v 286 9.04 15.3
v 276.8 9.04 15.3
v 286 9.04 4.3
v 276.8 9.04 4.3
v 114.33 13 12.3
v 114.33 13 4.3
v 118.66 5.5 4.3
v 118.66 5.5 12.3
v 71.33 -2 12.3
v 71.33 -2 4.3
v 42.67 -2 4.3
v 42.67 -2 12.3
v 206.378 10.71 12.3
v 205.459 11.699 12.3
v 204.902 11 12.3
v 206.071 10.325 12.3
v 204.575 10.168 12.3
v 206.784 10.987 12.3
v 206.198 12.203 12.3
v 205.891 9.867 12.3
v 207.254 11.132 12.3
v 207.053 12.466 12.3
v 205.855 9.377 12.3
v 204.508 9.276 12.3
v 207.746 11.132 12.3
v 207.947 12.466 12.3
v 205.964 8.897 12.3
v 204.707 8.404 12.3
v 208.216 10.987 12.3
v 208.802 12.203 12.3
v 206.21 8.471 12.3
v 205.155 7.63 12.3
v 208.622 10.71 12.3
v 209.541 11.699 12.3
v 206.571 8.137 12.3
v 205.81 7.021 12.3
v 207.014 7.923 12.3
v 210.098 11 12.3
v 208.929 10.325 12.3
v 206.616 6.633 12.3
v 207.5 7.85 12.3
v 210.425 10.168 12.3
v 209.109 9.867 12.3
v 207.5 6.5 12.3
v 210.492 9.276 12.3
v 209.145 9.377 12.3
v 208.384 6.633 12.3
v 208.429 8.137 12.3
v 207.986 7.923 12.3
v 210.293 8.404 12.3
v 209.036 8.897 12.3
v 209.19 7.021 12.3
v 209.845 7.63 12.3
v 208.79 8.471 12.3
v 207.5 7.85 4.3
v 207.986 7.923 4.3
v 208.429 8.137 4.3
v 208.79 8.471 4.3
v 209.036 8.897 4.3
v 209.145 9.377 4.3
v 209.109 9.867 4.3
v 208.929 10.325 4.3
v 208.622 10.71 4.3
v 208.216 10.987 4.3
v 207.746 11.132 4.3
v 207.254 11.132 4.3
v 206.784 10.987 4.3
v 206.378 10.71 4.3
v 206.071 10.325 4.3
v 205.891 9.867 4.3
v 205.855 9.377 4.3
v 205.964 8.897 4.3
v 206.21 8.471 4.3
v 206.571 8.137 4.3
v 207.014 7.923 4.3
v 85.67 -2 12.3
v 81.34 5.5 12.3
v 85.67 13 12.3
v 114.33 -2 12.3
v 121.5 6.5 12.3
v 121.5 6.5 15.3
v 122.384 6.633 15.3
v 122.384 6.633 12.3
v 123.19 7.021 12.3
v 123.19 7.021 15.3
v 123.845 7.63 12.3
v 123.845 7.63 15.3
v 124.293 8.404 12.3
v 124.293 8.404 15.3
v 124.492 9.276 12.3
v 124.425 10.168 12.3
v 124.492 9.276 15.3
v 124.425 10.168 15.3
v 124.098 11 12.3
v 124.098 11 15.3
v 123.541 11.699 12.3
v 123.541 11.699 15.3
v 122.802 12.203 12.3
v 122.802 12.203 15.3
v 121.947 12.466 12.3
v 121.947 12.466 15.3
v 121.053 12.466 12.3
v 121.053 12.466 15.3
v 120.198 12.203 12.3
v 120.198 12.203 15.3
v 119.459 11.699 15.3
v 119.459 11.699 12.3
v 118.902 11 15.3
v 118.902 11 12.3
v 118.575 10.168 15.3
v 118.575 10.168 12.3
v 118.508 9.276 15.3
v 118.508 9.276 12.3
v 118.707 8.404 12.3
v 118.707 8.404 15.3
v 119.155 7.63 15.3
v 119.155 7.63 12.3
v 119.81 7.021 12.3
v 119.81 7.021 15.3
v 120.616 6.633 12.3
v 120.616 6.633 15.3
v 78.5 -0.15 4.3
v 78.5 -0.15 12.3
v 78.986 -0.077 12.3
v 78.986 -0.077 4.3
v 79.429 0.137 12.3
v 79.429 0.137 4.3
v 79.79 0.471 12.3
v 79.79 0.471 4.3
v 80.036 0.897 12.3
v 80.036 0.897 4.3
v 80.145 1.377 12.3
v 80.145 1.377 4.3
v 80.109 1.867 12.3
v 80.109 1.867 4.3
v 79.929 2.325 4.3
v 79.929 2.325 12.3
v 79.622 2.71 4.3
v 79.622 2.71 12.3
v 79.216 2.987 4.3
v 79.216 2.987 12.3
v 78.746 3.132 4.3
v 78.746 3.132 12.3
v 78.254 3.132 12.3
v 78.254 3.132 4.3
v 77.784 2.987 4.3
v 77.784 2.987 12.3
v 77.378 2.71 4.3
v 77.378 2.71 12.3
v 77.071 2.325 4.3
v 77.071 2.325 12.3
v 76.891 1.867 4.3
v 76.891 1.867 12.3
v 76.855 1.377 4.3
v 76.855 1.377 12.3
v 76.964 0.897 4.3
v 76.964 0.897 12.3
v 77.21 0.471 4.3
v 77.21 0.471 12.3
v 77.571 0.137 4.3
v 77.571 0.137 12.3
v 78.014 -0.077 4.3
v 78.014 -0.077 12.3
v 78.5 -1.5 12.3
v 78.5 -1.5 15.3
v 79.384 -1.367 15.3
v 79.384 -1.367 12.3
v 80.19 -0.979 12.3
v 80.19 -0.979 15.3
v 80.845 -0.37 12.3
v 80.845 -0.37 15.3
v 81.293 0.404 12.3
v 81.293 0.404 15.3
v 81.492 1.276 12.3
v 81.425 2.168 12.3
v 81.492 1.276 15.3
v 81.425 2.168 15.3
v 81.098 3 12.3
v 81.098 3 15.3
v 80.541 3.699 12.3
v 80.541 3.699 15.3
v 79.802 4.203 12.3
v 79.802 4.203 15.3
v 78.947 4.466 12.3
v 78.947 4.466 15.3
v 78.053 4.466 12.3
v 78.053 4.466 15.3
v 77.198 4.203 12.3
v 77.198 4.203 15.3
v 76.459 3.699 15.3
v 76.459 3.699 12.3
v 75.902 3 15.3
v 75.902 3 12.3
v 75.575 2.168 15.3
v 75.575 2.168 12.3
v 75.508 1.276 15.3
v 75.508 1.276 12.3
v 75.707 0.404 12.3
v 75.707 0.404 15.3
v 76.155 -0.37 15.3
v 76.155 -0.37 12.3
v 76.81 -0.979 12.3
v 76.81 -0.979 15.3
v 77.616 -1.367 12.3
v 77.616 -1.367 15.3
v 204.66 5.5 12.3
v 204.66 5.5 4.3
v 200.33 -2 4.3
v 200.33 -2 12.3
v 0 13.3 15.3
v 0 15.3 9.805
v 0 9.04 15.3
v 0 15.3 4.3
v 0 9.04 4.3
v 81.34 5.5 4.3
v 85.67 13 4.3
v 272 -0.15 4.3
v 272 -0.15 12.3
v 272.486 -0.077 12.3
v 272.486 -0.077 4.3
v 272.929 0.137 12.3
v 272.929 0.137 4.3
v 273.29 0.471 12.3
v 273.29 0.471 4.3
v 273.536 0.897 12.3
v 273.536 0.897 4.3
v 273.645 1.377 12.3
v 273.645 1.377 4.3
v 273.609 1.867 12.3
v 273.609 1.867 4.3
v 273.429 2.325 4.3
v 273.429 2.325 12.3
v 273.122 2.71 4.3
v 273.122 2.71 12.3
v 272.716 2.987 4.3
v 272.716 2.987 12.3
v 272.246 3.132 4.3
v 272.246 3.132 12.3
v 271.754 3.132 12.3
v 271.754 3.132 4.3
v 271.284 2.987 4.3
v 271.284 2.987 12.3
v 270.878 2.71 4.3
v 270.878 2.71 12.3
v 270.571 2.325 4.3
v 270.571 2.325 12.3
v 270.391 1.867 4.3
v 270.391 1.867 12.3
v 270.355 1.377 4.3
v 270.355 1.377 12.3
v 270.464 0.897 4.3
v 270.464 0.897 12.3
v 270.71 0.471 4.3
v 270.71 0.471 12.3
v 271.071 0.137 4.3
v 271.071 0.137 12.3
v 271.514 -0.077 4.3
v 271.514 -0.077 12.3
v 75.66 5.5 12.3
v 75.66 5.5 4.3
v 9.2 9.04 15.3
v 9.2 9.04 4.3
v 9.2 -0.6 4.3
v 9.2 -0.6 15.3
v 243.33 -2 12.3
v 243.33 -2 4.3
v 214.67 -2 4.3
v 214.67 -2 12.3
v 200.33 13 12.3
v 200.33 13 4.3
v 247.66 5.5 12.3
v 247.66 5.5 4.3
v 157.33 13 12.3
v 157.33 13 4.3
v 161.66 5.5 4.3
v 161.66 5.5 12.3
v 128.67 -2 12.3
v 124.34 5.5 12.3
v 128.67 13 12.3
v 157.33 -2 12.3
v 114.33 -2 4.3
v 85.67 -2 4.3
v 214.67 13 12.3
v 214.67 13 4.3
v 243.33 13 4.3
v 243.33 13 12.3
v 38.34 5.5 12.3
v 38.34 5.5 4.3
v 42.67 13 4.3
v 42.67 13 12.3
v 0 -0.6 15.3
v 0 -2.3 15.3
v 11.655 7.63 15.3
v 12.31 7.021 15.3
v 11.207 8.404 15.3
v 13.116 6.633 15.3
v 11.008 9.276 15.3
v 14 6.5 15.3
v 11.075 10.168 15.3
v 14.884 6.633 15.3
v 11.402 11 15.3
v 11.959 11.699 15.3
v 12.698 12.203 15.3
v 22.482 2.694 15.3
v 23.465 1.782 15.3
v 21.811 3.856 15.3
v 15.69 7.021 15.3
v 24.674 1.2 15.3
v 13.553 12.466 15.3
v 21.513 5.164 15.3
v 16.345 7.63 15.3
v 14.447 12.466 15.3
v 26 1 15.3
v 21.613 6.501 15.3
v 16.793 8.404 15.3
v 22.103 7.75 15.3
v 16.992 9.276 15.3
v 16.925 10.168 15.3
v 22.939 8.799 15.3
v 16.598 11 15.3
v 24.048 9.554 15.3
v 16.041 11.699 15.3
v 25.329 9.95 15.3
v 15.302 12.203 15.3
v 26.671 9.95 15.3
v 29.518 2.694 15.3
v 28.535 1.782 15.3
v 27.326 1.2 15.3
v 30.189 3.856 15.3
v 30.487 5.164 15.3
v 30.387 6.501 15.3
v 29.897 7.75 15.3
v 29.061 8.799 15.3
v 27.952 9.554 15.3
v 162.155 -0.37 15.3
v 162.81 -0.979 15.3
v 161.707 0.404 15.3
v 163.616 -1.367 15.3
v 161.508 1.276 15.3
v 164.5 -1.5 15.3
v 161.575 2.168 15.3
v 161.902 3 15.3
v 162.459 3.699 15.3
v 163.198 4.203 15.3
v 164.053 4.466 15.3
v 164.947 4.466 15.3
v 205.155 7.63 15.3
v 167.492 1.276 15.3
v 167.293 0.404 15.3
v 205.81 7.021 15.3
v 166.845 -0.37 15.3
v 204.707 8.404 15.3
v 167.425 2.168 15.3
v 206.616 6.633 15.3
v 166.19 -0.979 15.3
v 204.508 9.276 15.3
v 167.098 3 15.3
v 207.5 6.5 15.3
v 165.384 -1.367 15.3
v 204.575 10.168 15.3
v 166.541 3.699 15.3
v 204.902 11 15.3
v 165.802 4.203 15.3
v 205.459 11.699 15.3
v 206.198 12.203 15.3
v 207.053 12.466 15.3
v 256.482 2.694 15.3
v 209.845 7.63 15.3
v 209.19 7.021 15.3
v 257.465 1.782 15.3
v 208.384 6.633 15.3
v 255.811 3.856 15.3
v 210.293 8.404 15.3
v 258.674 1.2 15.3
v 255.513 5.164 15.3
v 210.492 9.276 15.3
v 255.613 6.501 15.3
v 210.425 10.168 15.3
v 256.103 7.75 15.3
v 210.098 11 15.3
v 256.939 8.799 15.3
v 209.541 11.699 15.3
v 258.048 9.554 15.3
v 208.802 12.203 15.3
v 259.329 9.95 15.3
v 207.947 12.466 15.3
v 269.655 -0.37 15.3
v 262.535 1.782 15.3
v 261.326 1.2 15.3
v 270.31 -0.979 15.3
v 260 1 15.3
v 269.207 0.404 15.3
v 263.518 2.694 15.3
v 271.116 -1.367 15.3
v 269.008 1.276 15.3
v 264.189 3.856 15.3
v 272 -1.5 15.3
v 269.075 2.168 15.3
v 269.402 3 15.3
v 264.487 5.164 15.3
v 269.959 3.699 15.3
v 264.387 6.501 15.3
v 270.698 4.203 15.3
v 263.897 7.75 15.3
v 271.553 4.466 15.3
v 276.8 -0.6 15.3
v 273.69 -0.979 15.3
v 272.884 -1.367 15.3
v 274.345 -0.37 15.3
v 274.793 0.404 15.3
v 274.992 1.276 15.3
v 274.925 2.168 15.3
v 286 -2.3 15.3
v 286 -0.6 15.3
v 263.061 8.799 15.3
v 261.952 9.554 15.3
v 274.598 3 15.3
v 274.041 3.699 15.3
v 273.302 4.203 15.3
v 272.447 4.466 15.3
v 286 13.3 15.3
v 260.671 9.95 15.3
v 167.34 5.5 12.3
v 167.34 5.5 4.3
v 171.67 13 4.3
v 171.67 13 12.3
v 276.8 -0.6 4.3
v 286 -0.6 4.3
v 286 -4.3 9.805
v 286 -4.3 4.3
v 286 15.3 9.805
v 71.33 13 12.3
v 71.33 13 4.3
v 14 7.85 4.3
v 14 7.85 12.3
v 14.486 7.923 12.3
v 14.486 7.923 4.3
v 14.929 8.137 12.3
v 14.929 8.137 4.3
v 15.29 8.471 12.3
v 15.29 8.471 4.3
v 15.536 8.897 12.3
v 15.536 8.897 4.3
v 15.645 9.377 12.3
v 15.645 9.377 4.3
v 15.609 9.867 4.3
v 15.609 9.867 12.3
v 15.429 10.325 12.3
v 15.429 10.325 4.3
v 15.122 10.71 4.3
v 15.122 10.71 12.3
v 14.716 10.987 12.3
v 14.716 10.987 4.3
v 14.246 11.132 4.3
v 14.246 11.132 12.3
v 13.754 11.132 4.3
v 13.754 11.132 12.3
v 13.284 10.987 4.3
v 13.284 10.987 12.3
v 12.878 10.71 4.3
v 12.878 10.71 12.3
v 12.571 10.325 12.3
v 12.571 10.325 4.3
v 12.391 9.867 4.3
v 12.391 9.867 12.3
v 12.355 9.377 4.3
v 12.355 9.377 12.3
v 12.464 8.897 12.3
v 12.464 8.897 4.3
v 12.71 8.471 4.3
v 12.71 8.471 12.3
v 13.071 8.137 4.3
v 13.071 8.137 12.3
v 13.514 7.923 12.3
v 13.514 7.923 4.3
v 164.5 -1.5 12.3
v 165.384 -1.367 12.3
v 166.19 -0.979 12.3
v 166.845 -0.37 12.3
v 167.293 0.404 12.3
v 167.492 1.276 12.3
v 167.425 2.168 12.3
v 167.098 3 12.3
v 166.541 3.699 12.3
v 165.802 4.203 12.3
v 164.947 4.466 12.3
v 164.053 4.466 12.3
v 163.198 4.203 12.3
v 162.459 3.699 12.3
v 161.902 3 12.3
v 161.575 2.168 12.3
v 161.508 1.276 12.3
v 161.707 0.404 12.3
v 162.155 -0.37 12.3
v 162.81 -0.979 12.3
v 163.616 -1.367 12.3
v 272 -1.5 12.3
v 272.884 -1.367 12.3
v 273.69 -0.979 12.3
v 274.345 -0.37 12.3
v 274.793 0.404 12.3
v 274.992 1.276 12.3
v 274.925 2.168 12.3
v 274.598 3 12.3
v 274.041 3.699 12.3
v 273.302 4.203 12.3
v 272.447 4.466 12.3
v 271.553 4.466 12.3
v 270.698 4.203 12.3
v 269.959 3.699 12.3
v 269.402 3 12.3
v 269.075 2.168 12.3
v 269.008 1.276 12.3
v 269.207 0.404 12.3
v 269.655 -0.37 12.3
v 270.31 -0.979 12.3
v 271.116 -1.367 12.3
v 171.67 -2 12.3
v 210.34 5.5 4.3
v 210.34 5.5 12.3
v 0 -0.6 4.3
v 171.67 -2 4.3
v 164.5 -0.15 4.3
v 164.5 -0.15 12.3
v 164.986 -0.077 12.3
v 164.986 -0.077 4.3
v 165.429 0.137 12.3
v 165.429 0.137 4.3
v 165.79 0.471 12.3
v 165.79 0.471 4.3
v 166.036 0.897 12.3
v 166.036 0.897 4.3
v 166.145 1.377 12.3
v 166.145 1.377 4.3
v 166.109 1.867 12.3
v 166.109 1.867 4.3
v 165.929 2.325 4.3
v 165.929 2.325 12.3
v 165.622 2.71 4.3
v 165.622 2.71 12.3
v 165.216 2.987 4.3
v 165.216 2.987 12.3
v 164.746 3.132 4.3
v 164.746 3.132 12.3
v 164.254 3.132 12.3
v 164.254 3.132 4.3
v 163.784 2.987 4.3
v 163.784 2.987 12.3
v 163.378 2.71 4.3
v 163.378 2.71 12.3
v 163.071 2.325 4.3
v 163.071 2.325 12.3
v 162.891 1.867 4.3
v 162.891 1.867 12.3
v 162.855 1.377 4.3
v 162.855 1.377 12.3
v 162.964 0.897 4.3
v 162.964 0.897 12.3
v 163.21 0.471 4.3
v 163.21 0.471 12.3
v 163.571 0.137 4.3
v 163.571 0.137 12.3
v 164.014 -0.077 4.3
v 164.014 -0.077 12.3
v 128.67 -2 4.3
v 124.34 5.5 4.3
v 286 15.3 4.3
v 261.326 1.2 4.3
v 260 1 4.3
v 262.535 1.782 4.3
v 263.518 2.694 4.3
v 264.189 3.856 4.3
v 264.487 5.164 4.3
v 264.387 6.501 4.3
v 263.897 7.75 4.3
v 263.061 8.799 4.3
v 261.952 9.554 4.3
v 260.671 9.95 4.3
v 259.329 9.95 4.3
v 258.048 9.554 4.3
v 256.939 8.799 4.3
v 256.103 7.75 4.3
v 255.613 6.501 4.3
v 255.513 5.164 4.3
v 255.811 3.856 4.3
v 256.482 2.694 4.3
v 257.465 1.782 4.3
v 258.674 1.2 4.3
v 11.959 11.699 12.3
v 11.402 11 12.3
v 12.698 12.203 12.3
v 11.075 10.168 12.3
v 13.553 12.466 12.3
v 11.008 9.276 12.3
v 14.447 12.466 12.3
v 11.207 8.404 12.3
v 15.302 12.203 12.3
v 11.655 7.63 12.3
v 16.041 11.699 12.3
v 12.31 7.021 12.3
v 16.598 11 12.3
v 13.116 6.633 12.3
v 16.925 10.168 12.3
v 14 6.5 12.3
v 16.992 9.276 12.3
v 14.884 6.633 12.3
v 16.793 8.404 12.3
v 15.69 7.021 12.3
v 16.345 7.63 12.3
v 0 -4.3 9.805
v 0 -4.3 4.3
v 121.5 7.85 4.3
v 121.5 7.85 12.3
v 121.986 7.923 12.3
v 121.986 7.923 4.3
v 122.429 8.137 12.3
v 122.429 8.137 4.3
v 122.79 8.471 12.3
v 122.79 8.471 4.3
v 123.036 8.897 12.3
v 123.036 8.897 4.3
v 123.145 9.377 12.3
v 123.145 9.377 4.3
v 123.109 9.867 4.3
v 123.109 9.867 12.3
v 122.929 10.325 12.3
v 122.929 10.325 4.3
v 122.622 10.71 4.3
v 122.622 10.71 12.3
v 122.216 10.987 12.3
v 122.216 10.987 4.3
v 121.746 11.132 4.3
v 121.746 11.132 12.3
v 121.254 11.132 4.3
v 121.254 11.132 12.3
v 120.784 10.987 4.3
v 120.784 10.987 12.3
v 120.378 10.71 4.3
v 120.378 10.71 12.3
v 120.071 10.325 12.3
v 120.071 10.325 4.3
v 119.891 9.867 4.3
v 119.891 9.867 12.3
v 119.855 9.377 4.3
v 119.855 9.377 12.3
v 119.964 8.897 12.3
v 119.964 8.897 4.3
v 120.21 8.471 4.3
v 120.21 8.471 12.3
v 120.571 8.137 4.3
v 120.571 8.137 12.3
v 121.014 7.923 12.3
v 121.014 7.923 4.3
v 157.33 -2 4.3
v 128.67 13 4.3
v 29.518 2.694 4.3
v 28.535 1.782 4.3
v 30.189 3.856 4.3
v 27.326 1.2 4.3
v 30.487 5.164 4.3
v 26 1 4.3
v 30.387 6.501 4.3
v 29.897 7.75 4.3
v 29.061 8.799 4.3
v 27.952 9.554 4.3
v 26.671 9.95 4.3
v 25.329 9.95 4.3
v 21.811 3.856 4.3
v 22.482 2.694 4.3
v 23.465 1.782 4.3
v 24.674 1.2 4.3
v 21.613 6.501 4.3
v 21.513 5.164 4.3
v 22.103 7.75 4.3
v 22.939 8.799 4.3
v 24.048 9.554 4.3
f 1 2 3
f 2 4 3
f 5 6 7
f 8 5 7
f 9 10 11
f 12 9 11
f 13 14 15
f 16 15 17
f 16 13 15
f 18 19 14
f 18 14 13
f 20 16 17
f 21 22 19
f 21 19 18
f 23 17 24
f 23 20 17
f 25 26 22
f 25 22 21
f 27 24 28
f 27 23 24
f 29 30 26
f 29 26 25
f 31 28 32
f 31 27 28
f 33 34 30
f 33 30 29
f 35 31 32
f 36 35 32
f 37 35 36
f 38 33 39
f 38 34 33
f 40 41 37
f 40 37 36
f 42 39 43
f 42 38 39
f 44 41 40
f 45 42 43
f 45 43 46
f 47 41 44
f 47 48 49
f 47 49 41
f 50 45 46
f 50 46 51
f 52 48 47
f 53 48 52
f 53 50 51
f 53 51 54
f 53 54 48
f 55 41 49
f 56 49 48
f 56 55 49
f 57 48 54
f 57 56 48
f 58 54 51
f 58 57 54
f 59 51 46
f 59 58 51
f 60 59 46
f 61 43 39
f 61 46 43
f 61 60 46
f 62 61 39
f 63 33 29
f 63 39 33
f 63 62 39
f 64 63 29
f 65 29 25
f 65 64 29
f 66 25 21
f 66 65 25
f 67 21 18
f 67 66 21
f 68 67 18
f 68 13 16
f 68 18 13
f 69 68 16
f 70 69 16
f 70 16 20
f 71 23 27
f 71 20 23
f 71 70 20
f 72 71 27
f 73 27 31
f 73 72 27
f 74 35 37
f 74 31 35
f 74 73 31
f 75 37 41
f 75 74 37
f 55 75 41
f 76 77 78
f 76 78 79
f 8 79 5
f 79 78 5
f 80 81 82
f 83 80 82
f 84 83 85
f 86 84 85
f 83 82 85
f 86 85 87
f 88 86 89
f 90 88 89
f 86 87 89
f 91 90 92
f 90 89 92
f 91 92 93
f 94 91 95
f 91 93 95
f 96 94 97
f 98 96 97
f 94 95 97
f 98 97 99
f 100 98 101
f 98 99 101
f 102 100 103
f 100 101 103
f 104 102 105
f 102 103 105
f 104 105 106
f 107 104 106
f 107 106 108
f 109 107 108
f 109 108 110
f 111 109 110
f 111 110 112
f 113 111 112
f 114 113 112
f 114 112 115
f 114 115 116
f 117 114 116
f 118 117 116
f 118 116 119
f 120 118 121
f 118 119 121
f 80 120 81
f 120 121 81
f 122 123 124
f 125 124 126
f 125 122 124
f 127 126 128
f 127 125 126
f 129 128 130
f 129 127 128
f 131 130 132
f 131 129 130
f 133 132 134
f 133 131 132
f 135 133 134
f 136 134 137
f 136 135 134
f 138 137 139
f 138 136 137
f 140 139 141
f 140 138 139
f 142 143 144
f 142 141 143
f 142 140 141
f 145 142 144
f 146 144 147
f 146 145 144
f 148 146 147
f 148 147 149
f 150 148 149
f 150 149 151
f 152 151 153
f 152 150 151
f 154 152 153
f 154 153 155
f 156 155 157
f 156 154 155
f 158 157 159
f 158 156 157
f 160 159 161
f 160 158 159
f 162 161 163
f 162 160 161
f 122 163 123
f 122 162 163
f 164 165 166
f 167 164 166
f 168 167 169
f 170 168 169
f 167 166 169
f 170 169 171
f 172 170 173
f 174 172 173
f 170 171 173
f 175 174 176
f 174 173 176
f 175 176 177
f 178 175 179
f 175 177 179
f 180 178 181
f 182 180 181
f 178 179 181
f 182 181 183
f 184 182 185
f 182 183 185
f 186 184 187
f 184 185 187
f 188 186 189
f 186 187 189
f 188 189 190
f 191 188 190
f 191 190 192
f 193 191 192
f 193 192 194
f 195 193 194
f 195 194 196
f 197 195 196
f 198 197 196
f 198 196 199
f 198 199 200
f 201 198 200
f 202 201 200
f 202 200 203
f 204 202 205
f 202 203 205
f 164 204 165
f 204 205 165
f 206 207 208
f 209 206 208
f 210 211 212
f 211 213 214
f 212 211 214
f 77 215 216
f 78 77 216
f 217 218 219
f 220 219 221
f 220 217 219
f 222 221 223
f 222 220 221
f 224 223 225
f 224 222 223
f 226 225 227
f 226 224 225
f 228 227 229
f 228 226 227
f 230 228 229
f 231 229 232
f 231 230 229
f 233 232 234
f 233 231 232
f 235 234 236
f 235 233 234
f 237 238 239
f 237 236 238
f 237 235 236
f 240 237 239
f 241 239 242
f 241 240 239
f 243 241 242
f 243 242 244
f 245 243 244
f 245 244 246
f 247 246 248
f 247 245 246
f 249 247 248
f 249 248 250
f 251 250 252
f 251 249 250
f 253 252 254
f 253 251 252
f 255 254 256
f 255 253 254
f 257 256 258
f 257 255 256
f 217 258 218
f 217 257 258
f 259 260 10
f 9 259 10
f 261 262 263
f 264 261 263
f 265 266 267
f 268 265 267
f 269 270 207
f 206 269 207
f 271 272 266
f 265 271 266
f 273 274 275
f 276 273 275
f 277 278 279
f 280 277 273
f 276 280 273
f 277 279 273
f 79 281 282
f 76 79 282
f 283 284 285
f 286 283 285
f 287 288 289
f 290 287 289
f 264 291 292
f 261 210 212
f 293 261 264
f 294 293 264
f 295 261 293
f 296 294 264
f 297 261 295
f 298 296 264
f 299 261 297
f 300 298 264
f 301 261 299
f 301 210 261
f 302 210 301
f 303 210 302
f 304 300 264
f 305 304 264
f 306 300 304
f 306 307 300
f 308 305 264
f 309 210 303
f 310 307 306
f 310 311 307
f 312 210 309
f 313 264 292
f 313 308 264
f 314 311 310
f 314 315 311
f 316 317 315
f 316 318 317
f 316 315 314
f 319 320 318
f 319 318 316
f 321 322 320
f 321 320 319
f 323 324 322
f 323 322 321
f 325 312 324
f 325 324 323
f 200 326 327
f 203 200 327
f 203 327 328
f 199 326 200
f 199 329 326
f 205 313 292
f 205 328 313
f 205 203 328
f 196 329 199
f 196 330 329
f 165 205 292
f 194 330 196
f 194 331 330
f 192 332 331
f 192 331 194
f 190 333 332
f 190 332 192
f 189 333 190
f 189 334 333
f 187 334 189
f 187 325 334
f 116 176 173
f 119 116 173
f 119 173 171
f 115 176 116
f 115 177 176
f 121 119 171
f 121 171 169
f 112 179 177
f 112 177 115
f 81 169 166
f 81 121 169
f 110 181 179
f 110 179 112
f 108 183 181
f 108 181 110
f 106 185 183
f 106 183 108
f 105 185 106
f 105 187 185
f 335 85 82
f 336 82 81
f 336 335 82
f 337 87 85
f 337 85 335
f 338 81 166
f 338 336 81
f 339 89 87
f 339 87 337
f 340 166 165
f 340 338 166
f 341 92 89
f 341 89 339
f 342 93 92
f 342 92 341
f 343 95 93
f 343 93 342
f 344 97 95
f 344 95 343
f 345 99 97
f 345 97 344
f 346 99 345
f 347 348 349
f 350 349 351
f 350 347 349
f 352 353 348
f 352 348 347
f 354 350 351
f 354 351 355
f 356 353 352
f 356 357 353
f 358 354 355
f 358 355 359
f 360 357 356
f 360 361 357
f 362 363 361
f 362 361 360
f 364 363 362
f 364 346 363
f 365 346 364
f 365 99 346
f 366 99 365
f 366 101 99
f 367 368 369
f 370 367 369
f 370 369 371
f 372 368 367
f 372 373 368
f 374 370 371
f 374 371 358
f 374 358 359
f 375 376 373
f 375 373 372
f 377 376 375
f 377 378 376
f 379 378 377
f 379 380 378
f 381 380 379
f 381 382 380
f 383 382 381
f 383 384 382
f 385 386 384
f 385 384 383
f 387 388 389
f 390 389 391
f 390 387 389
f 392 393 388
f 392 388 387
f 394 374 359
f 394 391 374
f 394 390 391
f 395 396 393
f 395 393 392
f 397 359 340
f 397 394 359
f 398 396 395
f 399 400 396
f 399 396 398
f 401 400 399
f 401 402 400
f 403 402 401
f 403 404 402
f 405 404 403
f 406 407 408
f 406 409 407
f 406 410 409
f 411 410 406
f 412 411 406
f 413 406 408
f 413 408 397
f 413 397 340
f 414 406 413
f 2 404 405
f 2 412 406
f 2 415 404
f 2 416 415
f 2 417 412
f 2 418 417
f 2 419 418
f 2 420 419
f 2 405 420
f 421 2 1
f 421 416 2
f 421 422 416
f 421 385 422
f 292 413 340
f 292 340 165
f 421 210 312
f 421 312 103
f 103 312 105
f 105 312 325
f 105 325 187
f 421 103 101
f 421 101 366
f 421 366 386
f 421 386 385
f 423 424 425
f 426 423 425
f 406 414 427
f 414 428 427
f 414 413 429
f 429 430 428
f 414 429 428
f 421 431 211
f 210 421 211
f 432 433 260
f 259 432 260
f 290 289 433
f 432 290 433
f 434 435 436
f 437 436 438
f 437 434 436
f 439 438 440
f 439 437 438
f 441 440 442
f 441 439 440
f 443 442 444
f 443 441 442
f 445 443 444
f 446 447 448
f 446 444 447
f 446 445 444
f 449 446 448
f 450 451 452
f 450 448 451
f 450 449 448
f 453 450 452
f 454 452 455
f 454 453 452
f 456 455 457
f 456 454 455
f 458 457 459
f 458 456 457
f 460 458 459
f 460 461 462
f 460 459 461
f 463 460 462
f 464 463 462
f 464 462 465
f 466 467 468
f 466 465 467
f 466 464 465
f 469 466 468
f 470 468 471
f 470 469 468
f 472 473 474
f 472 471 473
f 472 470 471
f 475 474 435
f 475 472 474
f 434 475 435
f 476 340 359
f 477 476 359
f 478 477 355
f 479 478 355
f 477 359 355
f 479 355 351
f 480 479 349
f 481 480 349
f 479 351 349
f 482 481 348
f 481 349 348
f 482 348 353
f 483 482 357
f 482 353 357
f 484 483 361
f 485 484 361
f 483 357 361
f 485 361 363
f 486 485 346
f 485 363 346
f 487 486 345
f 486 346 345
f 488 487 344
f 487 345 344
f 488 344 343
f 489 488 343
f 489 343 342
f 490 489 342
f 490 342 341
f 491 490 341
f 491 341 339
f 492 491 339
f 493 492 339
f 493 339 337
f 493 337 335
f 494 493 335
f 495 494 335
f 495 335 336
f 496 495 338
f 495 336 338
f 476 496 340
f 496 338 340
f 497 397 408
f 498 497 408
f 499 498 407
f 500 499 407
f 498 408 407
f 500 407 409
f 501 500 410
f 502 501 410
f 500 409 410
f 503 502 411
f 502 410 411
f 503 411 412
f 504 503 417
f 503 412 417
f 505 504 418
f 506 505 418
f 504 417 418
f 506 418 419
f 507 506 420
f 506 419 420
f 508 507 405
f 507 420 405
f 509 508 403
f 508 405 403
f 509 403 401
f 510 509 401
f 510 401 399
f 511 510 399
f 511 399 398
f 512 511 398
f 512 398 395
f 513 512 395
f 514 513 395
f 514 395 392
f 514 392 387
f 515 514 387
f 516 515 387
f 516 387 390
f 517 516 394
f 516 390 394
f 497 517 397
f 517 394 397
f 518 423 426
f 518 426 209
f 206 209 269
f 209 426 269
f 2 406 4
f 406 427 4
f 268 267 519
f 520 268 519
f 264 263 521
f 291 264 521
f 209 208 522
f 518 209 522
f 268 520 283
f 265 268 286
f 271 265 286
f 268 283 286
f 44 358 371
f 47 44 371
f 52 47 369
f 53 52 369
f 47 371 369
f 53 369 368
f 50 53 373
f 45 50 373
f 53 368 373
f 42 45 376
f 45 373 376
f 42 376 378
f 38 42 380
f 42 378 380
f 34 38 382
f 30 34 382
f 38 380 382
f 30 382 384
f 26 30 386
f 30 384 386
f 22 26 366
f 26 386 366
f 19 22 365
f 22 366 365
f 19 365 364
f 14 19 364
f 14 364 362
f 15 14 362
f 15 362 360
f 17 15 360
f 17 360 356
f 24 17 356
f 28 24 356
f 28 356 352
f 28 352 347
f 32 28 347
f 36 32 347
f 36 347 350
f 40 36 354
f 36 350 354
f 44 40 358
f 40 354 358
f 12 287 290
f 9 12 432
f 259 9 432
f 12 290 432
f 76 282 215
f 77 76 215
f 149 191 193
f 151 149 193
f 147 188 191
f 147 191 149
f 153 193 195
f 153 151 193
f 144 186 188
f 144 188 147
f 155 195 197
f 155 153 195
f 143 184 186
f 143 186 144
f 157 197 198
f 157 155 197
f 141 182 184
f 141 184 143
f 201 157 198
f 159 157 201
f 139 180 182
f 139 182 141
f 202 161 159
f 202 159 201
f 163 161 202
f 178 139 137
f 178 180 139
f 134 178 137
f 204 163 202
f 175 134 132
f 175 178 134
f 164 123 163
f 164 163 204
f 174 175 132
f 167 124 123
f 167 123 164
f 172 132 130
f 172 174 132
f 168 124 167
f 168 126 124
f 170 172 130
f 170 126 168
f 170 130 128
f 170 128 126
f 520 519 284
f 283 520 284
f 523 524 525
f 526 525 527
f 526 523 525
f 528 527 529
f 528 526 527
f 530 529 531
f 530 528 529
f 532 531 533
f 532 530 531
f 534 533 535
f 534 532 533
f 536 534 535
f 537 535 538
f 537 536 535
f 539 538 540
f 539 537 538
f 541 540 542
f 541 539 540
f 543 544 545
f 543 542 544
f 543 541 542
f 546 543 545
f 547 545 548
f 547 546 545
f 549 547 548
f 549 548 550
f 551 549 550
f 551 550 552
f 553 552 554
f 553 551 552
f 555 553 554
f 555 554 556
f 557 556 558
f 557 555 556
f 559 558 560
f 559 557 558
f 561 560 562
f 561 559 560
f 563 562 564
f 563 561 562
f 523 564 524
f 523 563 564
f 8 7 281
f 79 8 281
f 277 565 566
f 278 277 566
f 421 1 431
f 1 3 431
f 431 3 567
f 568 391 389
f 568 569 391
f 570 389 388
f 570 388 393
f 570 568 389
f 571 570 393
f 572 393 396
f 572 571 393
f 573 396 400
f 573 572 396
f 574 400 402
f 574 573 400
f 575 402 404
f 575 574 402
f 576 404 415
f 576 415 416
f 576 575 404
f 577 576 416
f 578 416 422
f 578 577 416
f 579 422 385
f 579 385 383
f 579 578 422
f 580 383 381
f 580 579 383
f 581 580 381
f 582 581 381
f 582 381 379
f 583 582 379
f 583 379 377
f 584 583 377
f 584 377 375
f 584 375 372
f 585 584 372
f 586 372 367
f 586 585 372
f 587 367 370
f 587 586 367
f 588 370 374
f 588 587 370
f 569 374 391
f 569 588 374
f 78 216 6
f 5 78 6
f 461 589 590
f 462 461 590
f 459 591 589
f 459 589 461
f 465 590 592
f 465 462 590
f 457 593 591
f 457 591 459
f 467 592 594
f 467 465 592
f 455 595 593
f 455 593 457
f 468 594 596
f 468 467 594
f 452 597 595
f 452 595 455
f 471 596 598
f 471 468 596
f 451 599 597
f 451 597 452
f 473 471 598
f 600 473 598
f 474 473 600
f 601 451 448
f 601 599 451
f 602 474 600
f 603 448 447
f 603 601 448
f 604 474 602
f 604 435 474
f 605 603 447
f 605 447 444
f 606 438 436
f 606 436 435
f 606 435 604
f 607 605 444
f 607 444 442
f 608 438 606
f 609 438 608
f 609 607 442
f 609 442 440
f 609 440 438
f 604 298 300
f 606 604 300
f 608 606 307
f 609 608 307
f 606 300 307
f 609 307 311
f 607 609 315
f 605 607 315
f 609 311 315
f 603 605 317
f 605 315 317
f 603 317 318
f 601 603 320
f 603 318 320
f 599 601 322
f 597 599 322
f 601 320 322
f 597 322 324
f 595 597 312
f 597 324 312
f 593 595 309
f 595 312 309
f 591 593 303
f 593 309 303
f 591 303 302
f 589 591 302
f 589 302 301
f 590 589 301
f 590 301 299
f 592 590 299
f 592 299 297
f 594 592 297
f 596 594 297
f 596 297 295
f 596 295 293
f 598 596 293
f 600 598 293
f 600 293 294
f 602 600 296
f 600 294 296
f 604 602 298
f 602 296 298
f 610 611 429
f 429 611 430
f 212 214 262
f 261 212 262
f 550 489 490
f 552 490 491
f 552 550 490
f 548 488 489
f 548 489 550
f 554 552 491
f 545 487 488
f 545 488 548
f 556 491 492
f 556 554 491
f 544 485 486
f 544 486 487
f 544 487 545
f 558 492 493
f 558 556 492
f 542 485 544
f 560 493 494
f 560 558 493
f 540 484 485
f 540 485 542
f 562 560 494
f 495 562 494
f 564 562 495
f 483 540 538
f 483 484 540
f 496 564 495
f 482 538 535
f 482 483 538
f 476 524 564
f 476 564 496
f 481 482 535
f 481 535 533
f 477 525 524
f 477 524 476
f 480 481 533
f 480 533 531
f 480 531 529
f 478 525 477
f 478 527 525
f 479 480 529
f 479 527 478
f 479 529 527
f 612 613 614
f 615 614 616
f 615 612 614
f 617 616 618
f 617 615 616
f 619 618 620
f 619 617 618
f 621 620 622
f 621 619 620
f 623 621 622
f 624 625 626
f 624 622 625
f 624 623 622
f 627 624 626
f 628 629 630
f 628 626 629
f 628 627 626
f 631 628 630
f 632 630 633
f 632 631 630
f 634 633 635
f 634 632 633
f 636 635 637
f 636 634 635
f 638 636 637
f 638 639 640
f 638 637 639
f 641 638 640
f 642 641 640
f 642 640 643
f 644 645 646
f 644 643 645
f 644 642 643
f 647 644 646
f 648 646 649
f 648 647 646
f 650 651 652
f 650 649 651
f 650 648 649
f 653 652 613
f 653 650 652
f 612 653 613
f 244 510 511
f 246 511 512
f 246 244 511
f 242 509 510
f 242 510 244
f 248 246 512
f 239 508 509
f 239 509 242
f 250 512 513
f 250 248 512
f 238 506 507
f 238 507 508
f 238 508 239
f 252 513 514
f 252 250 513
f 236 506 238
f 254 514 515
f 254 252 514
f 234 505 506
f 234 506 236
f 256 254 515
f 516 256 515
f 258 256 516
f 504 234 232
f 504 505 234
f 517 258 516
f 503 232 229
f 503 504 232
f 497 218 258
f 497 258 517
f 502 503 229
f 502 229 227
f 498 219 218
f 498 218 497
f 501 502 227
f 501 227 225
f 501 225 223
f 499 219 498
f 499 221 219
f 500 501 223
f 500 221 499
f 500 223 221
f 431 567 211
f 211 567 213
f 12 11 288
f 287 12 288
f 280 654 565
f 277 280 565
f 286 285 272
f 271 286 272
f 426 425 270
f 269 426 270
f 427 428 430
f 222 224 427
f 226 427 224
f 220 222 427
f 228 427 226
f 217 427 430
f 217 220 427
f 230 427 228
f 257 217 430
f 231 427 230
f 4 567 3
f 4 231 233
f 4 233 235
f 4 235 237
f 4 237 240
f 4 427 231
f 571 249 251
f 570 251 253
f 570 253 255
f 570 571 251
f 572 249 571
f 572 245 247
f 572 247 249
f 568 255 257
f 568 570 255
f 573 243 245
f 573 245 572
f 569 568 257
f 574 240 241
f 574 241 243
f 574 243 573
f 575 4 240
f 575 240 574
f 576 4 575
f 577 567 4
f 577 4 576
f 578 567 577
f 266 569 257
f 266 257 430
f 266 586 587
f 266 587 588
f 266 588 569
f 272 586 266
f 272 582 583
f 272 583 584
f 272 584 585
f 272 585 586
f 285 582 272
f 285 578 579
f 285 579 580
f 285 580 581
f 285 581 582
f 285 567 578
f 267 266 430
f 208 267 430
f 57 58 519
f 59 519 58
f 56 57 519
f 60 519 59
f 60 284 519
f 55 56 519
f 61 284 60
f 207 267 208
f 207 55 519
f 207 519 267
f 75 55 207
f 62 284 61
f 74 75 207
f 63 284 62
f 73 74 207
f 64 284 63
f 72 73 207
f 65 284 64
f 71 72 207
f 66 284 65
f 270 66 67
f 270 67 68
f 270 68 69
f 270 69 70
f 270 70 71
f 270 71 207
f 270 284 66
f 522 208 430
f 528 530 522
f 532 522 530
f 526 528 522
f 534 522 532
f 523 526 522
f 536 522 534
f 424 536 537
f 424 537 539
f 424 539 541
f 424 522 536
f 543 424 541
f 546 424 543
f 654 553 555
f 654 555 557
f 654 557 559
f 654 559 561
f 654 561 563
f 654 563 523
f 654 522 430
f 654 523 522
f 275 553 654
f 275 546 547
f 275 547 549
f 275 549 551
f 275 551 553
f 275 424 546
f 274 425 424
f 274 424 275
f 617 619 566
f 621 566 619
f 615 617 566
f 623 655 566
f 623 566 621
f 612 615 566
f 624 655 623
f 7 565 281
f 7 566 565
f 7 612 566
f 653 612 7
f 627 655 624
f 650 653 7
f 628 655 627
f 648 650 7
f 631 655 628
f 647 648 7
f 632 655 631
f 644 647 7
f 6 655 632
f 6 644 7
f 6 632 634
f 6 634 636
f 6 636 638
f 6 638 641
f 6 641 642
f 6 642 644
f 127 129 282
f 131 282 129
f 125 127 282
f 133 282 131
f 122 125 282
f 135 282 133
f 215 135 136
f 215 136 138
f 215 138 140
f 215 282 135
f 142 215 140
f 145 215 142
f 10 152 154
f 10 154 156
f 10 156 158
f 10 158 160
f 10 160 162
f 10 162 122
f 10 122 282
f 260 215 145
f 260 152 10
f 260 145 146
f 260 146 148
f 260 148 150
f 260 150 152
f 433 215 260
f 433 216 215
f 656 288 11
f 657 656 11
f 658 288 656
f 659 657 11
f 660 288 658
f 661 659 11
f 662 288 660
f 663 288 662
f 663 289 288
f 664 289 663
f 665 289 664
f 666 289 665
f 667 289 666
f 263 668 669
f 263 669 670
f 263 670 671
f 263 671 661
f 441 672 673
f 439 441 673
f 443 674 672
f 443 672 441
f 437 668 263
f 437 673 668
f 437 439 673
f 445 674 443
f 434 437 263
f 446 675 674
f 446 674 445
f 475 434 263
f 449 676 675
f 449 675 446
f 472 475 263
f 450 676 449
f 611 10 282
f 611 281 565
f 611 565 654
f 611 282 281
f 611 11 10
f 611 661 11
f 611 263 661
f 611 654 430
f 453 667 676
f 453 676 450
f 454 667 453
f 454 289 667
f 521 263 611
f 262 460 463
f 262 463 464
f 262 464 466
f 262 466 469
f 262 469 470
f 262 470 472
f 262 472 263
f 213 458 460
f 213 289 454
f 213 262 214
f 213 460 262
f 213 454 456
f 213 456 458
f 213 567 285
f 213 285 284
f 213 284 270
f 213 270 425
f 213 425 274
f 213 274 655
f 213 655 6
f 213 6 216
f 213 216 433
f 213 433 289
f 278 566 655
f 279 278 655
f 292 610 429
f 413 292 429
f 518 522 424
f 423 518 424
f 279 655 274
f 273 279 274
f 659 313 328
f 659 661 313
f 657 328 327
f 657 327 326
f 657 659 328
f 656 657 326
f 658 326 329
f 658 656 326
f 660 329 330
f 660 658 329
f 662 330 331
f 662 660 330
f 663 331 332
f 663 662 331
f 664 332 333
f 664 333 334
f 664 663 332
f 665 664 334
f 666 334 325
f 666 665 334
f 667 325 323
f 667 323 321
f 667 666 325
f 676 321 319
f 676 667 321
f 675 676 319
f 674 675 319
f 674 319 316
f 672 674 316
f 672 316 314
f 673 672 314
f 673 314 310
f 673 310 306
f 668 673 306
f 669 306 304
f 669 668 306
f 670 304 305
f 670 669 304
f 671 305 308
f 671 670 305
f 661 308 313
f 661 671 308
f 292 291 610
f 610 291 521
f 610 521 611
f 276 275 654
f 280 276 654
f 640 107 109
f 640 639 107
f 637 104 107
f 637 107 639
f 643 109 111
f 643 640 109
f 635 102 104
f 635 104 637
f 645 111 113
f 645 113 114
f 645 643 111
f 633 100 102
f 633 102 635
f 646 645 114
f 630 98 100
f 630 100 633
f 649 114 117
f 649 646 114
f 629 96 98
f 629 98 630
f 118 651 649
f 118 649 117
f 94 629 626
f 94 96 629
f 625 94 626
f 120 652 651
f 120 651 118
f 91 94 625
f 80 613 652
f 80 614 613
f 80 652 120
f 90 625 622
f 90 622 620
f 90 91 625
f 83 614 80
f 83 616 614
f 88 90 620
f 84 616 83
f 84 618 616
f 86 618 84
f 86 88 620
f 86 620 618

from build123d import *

# Parameters (mm, degrees)
SKIZZE1_R                          = 4.5
SKIZZE1_R_2                        = 1.65
AUFSATZ_LINEAR_AUSTRAGEN1_DEPTH    = 8
SKIZZE2_R                          = 4.5
SKIZZE2_R_2                        = 1.65
AUFSATZ_LINEAR_AUSTRAGEN2_DEPTH    = 3
FASE1_SIZE                         = 2
FASE1_SIZE2                        = 5.494954839
SKIZZE3_R                          = 3
SCHNITT_LINEAR_AUSTRAGEN1_DEPTH    = 3
K_RPER_VERSCHIEBEN_KOPIEREN1_ANGLE = 90


with BuildPart() as part:
    # Skizze1 → Aufsatz-Linear austragen1 (new body)
    with BuildSketch(Plane(origin=(0, 0, 0), x_dir=(1, 0, 0), z_dir=(0, 1, 0))):
        Polygon((286, 0), (286, -6.26), (276.8, -6.26), (276.8, -15.9), (286, -15.9), (286, -19.6), (0, -19.6), (0, -15.9), (9.2, -15.9), (9.2, -6.26), (0, -6.26), (0, 0), align=None)
        with Locations(Location((260, -9.8, 0), (0, 0, 270))):
            Circle(SKIZZE1_R, mode=Mode.SUBTRACT)
        with Locations(Location((26, -9.8, 0), (0, 0, 270))):
            Circle(SKIZZE1_R, mode=Mode.SUBTRACT)
        with Locations(Location((14, -5.8, 0), (0, 0, 270))):
            Circle(SKIZZE1_R_2, mode=Mode.SUBTRACT)
        with Locations(Location((78.5, -13.8, 0), (0, 0, 270))):
            Circle(SKIZZE1_R_2, mode=Mode.SUBTRACT)
        with Locations(Location((121.5, -5.8, 0), (0, 0, 270))):
            Circle(SKIZZE1_R_2, mode=Mode.SUBTRACT)
        with Locations(Location((164.5, -13.8, 0), (0, 0, 270))):
            Circle(SKIZZE1_R_2, mode=Mode.SUBTRACT)
        with Locations(Location((207.5, -5.8, 0), (0, 0, 270))):
            Circle(SKIZZE1_R_2, mode=Mode.SUBTRACT)
        with Locations(Location((272, -13.8, 0), (0, 0, 270))):
            Circle(SKIZZE1_R_2, mode=Mode.SUBTRACT)
        Polygon((200.330127019, -2.3), (204.660254038, -9.8), (200.330127019, -17.3), (171.669872981, -17.3), (167.339745962, -9.8), (171.669872981, -2.3), align=None, mode=Mode.SUBTRACT)
        Polygon((243.330127019, -2.3), (247.660254038, -9.8), (243.330127019, -17.3), (214.669872981, -17.3), (210.339745962, -9.8), (214.669872981, -2.3), align=None, mode=Mode.SUBTRACT)
        Polygon((81.339745962, -9.8), (85.669872981, -2.3), (114.330127019, -2.3), (118.660254038, -9.8), (114.330127019, -17.3), (85.669872981, -17.3), align=None, mode=Mode.SUBTRACT)
        Polygon((38.339745962, -9.8), (42.669872981, -2.3), (71.330127019, -2.3), (75.660254038, -9.8), (71.330127019, -17.3), (42.669872981, -17.3), align=None, mode=Mode.SUBTRACT)
        Polygon((128.669872981, -2.3), (157.330127019, -2.3), (161.660254038, -9.8), (157.330127019, -17.3), (128.669872981, -17.3), (124.339745962, -9.8), align=None, mode=Mode.SUBTRACT)
    extrude(amount=AUFSATZ_LINEAR_AUSTRAGEN1_DEPTH)

    # Skizze2 → Aufsatz-Linear austragen2 (add)
    with BuildSketch(Plane(origin=(0, 8, 0), x_dir=(1, 0, 0), z_dir=(0, 1, 0))):
        Polygon((0, -19.6), (286, -19.6), (286, -15.9), (276.8, -15.9), (276.8, -6.26), (286, -6.26), (286, 0), (0, 0), (0, -6.26), (9.2, -6.26), (9.2, -15.9), (0, -15.9), align=None)
        with Locations(Location((260, -9.8, 0), (0, 0, 270))):
            Circle(SKIZZE2_R, mode=Mode.SUBTRACT)
        with Locations(Location((26, -9.8, 0), (0, 0, 270))):
            Circle(SKIZZE2_R, mode=Mode.SUBTRACT)
        with Locations(Location((272, -13.8, 0), (0, 0, 270))):
            Circle(SKIZZE2_R_2, mode=Mode.SUBTRACT)
        with Locations(Location((207.5, -5.8, 0), (0, 0, 270))):
            Circle(SKIZZE2_R_2, mode=Mode.SUBTRACT)
        with Locations(Location((164.5, -13.8, 0), (0, 0, 270))):
            Circle(SKIZZE2_R_2, mode=Mode.SUBTRACT)
        with Locations(Location((78.5, -13.8, 0), (0, 0, 270))):
            Circle(SKIZZE2_R_2, mode=Mode.SUBTRACT)
        with Locations(Location((121.5, -5.8, 0), (0, 0, 270))):
            Circle(SKIZZE2_R_2, mode=Mode.SUBTRACT)
        with Locations(Location((14, -5.8, 0), (0, 0, 270))):
            Circle(SKIZZE2_R_2, mode=Mode.SUBTRACT)
    extrude(amount=AUFSATZ_LINEAR_AUSTRAGEN2_DEPTH)

    # Fase1
    fase1_edges = [part.edges().sort_by_distance(p)[0] for p in [
        (143, 11, 19.6),
        (143, 11, 0),
    ]]
    fase1_side = [part.faces().sort_by_distance(p)[0] for p in [
        (143, 11, 9.756751336),
    ]]
    chamfer(fase1_edges, length=FASE1_SIZE, length2=FASE1_SIZE2, reference=fase1_side[0])

    # Skizze3 → Schnitt-Linear austragen1 (cut)
    with BuildSketch(Plane(origin=(0, 11, 0), x_dir=(1, 0, 0), z_dir=(0, 1, 0))):
        with Locations(Location((14, -5.8, 0), (0, 0, 270))):
            Circle(SKIZZE3_R)
        with Locations(Location((78.5, -13.8, 0), (0, 0, 270))):
            Circle(SKIZZE3_R)
        with Locations(Location((121.5, -5.8, 0), (0, 0, 270))):
            Circle(SKIZZE3_R)
        with Locations(Location((164.5, -13.8, 0), (0, 0, 270))):
            Circle(SKIZZE3_R)
        with Locations(Location((207.5, -5.8, 0), (0, 0, 270))):
            Circle(SKIZZE3_R)
        with Locations(Location((272, -13.8, 0), (0, 0, 270))):
            Circle(SKIZZE3_R)
    extrude(amount=-SCHNITT_LINEAR_AUSTRAGEN1_DEPTH, mode=Mode.SUBTRACT)


with BuildPart() as part_1:
    # Körper-Verschieben/Kopieren1: moved
    add(part.part.rotate(Axis((0, 5.5, 9.8), (1, 0, 0)), K_RPER_VERSCHIEBEN_KOPIEREN1_ANGLE))


solid = part_1.part
